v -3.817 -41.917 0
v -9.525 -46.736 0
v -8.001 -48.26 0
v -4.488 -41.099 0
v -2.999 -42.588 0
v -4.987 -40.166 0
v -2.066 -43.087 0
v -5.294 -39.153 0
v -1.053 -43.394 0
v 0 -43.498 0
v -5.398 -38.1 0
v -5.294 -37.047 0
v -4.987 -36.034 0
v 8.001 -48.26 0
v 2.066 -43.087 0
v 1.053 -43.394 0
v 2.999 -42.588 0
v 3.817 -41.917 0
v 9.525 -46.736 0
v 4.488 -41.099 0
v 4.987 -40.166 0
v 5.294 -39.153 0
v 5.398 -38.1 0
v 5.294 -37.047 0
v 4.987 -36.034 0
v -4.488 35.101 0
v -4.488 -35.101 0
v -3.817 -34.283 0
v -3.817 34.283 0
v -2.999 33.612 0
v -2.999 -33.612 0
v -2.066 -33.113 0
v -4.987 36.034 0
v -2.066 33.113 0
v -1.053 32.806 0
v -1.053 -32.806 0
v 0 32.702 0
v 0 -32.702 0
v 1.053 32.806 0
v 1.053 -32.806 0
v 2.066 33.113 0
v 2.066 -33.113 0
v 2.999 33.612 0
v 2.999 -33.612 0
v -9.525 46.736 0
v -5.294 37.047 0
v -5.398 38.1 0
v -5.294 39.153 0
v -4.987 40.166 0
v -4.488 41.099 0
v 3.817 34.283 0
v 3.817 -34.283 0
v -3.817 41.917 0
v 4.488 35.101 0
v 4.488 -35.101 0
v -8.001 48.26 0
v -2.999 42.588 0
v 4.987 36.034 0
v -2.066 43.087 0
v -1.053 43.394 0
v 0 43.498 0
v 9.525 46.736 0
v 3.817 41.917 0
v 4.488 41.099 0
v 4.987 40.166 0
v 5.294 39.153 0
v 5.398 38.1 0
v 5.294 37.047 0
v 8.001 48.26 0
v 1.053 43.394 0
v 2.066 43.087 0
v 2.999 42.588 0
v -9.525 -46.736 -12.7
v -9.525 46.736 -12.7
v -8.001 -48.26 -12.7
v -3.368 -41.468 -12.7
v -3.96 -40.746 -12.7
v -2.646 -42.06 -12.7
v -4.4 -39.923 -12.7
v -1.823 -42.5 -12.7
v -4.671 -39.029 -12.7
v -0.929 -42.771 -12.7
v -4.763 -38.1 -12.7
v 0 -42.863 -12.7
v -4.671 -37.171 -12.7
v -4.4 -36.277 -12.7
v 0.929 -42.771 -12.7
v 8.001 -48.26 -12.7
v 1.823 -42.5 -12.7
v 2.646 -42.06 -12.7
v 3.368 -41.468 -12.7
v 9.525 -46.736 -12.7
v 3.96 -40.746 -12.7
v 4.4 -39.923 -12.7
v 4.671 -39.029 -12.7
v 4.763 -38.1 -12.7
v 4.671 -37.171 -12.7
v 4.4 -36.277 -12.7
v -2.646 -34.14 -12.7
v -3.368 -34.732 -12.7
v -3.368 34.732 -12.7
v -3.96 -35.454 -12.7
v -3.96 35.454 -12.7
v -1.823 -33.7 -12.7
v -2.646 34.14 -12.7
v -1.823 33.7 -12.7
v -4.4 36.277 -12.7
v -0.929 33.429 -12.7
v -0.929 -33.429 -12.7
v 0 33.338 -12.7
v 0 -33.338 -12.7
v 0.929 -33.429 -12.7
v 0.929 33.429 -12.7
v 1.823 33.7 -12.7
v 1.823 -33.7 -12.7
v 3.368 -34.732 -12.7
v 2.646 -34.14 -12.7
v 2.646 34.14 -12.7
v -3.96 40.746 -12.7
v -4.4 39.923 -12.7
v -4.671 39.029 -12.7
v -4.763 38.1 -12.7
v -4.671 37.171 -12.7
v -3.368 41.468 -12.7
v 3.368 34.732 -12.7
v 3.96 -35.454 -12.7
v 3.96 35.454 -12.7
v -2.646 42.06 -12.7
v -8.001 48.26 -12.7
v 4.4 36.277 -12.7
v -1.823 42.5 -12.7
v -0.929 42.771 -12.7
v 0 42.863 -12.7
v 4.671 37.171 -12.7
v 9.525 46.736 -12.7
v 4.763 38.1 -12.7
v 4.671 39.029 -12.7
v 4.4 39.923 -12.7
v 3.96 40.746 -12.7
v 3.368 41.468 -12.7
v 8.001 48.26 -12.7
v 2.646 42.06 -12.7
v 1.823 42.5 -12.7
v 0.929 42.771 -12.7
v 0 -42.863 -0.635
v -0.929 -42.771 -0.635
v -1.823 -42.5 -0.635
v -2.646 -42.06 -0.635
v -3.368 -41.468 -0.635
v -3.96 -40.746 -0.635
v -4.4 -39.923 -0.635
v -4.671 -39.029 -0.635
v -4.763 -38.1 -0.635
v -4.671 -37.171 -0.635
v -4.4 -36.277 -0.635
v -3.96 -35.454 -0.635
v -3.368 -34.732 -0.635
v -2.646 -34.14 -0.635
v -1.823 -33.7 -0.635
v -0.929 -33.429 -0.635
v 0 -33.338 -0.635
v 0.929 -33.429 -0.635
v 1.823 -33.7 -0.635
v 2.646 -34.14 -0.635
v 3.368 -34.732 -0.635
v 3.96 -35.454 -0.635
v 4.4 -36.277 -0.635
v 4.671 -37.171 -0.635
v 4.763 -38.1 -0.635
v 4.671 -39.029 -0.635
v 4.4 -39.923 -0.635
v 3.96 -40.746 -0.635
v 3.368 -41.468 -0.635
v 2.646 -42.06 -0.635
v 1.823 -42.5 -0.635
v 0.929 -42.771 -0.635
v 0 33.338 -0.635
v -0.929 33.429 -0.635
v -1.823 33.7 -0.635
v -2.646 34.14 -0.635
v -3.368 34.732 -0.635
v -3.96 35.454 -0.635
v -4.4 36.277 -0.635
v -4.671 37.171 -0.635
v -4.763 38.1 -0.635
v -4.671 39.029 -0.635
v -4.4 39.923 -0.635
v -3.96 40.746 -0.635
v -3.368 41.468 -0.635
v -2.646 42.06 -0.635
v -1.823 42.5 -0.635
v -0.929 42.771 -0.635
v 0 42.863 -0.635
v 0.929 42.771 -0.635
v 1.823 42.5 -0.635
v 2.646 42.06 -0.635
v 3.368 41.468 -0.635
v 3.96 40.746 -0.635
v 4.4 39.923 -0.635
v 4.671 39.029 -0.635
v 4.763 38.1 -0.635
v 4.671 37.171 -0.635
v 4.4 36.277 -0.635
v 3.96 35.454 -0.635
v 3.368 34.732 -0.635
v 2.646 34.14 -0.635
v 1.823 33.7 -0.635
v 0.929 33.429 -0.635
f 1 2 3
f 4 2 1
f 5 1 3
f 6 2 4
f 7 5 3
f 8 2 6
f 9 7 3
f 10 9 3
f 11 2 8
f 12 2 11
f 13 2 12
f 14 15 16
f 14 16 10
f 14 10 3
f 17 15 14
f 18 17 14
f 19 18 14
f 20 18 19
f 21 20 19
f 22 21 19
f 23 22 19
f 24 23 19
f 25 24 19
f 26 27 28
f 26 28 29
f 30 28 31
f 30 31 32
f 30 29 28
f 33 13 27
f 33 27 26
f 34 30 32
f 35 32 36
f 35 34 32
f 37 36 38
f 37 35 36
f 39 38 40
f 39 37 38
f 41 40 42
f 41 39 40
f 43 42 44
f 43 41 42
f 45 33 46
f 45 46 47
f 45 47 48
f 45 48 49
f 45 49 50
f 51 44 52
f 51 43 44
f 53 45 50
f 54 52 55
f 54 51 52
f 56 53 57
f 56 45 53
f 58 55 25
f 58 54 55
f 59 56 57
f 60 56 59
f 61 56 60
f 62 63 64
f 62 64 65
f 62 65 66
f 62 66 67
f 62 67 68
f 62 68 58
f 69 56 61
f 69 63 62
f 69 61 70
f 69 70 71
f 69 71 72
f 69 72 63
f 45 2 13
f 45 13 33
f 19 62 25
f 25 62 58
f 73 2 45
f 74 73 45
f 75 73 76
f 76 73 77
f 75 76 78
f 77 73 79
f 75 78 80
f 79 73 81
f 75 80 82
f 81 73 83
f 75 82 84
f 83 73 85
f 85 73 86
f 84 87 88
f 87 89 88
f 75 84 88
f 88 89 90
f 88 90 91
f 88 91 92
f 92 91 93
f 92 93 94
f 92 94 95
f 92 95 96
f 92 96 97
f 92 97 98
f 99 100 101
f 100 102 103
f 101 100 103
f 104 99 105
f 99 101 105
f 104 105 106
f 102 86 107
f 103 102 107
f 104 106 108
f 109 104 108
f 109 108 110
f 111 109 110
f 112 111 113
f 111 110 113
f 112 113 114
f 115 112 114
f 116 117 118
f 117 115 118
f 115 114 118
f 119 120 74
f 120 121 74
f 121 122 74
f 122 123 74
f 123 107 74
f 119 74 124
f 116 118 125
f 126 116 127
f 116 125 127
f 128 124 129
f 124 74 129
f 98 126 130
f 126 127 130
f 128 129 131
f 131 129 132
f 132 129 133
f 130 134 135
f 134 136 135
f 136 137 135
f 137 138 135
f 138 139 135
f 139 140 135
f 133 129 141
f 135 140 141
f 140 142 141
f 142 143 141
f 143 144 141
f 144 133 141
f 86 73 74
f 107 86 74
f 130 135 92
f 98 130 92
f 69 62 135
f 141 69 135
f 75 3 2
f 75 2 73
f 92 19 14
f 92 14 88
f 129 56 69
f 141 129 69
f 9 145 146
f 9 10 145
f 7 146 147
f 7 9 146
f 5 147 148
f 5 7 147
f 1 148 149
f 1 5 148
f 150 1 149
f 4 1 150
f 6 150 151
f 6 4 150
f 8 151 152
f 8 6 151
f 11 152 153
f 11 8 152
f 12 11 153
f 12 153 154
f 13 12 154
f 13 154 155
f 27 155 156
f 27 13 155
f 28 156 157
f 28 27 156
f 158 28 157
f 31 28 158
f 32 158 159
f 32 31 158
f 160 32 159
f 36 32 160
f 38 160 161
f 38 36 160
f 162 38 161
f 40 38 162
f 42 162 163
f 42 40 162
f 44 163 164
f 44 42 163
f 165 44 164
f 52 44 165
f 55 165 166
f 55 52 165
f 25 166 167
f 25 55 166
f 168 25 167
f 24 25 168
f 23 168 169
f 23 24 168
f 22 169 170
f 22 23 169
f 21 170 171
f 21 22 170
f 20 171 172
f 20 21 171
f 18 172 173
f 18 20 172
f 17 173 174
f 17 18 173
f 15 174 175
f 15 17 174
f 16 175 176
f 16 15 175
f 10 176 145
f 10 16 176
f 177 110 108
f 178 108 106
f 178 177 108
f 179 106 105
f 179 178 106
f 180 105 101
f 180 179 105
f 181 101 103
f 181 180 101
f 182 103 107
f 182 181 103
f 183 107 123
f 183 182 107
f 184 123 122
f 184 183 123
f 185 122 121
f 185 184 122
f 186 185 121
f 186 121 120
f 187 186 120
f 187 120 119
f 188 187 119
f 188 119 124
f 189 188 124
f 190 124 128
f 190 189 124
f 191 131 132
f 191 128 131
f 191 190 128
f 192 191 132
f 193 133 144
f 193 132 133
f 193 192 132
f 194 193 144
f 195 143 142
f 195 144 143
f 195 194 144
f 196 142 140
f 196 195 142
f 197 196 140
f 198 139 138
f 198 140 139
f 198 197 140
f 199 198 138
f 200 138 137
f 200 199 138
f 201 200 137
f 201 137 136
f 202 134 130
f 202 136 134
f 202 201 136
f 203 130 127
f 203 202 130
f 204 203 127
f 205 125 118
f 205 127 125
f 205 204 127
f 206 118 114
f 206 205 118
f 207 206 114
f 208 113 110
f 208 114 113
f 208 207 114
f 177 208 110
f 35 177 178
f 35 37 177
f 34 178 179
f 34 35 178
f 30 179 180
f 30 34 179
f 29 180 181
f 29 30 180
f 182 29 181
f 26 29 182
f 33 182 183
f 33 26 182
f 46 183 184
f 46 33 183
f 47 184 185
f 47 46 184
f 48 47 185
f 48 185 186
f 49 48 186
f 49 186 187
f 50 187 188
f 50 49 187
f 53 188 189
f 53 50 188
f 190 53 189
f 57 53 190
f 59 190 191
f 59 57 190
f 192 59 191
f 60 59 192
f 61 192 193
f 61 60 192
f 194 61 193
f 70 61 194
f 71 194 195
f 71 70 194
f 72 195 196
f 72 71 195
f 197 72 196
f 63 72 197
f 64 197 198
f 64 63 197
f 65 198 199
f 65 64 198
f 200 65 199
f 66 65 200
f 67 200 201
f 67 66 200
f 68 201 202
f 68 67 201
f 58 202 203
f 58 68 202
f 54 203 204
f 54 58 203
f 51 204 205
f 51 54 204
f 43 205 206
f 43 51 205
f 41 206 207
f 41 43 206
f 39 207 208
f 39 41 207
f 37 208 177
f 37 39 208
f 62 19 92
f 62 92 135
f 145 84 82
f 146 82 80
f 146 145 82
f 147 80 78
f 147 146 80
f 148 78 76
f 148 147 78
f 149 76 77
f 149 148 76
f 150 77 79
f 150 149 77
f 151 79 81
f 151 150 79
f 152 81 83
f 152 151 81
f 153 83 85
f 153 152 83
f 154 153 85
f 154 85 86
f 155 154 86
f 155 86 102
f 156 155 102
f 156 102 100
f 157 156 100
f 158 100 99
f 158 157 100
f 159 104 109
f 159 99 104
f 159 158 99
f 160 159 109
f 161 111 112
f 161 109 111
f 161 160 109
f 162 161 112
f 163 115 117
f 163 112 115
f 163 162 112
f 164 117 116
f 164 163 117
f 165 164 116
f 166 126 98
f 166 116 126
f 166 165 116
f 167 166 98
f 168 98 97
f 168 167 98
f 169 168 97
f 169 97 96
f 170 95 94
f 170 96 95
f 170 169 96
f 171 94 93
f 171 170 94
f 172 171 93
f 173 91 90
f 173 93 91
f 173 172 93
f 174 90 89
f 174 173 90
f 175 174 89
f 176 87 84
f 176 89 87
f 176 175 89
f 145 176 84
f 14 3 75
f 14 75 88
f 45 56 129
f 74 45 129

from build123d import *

# Parameters (mm, degrees)
SKETCH1_W                        = 19.05
SKETCH1_H                        = 96.52
BOSS_EXTRUDE1_DEPTH              = 12.7
F_3_8_16_TAPPED_HOLE1_AT_2_COUNT = 2
F_3_8_16_TAPPED_HOLE1_AT_2_PITCH = 76.2
CHAMFER1_SIZE                    = 1.524


with BuildPart() as part:
    # Sketch1 → Boss-Extrude1 (new body)
    with BuildSketch(Plane.XY):
        Rectangle(SKETCH1_W, SKETCH1_H)
    extrude(amount=-BOSS_EXTRUDE1_DEPTH)

    # Sketch18 → 3/8-16 Tapped Hole1 (revolve, cut)
    with BuildSketch(Plane(origin=(0, -38.1, 0), x_dir=(0, -1, 0), z_dir=(1, 0, 0))):
        Polygon((0, 0), (0, 29.384865582), (3.96875, 27.0002), (3.96875, 19.05), (4.7625, 19.05), (4.7625, 0.635), (5.3975, 0), align=None)
    f_3_8_16_tapped_hole1 = revolve(axis=Axis((0, -38.1, 6.35), (0, 0, -1)), mode=Mode.SUBTRACT)

    # 3/8-16 Tapped Hole1 at 2: 3/8-16 Tapped Hole1 ×2
    with Locations(*[(0, i * F_3_8_16_TAPPED_HOLE1_AT_2_PITCH, 0) for i in range(1, F_3_8_16_TAPPED_HOLE1_AT_2_COUNT)]):
        add(f_3_8_16_tapped_hole1, mode=Mode.SUBTRACT)

    # Chamfer1
    chamfer1_edges = [part.edges().sort_by_distance(p)[0] for p in [
        (-9.525, 48.26, -6.35),
        (9.525, 48.26, -6.35),
        (9.525, -48.26, -6.35),
        (-9.525, -48.26, -6.35),
    ]]
    chamfer(chamfer1_edges, length=CHAMFER1_SIZE)


solid = part.part
